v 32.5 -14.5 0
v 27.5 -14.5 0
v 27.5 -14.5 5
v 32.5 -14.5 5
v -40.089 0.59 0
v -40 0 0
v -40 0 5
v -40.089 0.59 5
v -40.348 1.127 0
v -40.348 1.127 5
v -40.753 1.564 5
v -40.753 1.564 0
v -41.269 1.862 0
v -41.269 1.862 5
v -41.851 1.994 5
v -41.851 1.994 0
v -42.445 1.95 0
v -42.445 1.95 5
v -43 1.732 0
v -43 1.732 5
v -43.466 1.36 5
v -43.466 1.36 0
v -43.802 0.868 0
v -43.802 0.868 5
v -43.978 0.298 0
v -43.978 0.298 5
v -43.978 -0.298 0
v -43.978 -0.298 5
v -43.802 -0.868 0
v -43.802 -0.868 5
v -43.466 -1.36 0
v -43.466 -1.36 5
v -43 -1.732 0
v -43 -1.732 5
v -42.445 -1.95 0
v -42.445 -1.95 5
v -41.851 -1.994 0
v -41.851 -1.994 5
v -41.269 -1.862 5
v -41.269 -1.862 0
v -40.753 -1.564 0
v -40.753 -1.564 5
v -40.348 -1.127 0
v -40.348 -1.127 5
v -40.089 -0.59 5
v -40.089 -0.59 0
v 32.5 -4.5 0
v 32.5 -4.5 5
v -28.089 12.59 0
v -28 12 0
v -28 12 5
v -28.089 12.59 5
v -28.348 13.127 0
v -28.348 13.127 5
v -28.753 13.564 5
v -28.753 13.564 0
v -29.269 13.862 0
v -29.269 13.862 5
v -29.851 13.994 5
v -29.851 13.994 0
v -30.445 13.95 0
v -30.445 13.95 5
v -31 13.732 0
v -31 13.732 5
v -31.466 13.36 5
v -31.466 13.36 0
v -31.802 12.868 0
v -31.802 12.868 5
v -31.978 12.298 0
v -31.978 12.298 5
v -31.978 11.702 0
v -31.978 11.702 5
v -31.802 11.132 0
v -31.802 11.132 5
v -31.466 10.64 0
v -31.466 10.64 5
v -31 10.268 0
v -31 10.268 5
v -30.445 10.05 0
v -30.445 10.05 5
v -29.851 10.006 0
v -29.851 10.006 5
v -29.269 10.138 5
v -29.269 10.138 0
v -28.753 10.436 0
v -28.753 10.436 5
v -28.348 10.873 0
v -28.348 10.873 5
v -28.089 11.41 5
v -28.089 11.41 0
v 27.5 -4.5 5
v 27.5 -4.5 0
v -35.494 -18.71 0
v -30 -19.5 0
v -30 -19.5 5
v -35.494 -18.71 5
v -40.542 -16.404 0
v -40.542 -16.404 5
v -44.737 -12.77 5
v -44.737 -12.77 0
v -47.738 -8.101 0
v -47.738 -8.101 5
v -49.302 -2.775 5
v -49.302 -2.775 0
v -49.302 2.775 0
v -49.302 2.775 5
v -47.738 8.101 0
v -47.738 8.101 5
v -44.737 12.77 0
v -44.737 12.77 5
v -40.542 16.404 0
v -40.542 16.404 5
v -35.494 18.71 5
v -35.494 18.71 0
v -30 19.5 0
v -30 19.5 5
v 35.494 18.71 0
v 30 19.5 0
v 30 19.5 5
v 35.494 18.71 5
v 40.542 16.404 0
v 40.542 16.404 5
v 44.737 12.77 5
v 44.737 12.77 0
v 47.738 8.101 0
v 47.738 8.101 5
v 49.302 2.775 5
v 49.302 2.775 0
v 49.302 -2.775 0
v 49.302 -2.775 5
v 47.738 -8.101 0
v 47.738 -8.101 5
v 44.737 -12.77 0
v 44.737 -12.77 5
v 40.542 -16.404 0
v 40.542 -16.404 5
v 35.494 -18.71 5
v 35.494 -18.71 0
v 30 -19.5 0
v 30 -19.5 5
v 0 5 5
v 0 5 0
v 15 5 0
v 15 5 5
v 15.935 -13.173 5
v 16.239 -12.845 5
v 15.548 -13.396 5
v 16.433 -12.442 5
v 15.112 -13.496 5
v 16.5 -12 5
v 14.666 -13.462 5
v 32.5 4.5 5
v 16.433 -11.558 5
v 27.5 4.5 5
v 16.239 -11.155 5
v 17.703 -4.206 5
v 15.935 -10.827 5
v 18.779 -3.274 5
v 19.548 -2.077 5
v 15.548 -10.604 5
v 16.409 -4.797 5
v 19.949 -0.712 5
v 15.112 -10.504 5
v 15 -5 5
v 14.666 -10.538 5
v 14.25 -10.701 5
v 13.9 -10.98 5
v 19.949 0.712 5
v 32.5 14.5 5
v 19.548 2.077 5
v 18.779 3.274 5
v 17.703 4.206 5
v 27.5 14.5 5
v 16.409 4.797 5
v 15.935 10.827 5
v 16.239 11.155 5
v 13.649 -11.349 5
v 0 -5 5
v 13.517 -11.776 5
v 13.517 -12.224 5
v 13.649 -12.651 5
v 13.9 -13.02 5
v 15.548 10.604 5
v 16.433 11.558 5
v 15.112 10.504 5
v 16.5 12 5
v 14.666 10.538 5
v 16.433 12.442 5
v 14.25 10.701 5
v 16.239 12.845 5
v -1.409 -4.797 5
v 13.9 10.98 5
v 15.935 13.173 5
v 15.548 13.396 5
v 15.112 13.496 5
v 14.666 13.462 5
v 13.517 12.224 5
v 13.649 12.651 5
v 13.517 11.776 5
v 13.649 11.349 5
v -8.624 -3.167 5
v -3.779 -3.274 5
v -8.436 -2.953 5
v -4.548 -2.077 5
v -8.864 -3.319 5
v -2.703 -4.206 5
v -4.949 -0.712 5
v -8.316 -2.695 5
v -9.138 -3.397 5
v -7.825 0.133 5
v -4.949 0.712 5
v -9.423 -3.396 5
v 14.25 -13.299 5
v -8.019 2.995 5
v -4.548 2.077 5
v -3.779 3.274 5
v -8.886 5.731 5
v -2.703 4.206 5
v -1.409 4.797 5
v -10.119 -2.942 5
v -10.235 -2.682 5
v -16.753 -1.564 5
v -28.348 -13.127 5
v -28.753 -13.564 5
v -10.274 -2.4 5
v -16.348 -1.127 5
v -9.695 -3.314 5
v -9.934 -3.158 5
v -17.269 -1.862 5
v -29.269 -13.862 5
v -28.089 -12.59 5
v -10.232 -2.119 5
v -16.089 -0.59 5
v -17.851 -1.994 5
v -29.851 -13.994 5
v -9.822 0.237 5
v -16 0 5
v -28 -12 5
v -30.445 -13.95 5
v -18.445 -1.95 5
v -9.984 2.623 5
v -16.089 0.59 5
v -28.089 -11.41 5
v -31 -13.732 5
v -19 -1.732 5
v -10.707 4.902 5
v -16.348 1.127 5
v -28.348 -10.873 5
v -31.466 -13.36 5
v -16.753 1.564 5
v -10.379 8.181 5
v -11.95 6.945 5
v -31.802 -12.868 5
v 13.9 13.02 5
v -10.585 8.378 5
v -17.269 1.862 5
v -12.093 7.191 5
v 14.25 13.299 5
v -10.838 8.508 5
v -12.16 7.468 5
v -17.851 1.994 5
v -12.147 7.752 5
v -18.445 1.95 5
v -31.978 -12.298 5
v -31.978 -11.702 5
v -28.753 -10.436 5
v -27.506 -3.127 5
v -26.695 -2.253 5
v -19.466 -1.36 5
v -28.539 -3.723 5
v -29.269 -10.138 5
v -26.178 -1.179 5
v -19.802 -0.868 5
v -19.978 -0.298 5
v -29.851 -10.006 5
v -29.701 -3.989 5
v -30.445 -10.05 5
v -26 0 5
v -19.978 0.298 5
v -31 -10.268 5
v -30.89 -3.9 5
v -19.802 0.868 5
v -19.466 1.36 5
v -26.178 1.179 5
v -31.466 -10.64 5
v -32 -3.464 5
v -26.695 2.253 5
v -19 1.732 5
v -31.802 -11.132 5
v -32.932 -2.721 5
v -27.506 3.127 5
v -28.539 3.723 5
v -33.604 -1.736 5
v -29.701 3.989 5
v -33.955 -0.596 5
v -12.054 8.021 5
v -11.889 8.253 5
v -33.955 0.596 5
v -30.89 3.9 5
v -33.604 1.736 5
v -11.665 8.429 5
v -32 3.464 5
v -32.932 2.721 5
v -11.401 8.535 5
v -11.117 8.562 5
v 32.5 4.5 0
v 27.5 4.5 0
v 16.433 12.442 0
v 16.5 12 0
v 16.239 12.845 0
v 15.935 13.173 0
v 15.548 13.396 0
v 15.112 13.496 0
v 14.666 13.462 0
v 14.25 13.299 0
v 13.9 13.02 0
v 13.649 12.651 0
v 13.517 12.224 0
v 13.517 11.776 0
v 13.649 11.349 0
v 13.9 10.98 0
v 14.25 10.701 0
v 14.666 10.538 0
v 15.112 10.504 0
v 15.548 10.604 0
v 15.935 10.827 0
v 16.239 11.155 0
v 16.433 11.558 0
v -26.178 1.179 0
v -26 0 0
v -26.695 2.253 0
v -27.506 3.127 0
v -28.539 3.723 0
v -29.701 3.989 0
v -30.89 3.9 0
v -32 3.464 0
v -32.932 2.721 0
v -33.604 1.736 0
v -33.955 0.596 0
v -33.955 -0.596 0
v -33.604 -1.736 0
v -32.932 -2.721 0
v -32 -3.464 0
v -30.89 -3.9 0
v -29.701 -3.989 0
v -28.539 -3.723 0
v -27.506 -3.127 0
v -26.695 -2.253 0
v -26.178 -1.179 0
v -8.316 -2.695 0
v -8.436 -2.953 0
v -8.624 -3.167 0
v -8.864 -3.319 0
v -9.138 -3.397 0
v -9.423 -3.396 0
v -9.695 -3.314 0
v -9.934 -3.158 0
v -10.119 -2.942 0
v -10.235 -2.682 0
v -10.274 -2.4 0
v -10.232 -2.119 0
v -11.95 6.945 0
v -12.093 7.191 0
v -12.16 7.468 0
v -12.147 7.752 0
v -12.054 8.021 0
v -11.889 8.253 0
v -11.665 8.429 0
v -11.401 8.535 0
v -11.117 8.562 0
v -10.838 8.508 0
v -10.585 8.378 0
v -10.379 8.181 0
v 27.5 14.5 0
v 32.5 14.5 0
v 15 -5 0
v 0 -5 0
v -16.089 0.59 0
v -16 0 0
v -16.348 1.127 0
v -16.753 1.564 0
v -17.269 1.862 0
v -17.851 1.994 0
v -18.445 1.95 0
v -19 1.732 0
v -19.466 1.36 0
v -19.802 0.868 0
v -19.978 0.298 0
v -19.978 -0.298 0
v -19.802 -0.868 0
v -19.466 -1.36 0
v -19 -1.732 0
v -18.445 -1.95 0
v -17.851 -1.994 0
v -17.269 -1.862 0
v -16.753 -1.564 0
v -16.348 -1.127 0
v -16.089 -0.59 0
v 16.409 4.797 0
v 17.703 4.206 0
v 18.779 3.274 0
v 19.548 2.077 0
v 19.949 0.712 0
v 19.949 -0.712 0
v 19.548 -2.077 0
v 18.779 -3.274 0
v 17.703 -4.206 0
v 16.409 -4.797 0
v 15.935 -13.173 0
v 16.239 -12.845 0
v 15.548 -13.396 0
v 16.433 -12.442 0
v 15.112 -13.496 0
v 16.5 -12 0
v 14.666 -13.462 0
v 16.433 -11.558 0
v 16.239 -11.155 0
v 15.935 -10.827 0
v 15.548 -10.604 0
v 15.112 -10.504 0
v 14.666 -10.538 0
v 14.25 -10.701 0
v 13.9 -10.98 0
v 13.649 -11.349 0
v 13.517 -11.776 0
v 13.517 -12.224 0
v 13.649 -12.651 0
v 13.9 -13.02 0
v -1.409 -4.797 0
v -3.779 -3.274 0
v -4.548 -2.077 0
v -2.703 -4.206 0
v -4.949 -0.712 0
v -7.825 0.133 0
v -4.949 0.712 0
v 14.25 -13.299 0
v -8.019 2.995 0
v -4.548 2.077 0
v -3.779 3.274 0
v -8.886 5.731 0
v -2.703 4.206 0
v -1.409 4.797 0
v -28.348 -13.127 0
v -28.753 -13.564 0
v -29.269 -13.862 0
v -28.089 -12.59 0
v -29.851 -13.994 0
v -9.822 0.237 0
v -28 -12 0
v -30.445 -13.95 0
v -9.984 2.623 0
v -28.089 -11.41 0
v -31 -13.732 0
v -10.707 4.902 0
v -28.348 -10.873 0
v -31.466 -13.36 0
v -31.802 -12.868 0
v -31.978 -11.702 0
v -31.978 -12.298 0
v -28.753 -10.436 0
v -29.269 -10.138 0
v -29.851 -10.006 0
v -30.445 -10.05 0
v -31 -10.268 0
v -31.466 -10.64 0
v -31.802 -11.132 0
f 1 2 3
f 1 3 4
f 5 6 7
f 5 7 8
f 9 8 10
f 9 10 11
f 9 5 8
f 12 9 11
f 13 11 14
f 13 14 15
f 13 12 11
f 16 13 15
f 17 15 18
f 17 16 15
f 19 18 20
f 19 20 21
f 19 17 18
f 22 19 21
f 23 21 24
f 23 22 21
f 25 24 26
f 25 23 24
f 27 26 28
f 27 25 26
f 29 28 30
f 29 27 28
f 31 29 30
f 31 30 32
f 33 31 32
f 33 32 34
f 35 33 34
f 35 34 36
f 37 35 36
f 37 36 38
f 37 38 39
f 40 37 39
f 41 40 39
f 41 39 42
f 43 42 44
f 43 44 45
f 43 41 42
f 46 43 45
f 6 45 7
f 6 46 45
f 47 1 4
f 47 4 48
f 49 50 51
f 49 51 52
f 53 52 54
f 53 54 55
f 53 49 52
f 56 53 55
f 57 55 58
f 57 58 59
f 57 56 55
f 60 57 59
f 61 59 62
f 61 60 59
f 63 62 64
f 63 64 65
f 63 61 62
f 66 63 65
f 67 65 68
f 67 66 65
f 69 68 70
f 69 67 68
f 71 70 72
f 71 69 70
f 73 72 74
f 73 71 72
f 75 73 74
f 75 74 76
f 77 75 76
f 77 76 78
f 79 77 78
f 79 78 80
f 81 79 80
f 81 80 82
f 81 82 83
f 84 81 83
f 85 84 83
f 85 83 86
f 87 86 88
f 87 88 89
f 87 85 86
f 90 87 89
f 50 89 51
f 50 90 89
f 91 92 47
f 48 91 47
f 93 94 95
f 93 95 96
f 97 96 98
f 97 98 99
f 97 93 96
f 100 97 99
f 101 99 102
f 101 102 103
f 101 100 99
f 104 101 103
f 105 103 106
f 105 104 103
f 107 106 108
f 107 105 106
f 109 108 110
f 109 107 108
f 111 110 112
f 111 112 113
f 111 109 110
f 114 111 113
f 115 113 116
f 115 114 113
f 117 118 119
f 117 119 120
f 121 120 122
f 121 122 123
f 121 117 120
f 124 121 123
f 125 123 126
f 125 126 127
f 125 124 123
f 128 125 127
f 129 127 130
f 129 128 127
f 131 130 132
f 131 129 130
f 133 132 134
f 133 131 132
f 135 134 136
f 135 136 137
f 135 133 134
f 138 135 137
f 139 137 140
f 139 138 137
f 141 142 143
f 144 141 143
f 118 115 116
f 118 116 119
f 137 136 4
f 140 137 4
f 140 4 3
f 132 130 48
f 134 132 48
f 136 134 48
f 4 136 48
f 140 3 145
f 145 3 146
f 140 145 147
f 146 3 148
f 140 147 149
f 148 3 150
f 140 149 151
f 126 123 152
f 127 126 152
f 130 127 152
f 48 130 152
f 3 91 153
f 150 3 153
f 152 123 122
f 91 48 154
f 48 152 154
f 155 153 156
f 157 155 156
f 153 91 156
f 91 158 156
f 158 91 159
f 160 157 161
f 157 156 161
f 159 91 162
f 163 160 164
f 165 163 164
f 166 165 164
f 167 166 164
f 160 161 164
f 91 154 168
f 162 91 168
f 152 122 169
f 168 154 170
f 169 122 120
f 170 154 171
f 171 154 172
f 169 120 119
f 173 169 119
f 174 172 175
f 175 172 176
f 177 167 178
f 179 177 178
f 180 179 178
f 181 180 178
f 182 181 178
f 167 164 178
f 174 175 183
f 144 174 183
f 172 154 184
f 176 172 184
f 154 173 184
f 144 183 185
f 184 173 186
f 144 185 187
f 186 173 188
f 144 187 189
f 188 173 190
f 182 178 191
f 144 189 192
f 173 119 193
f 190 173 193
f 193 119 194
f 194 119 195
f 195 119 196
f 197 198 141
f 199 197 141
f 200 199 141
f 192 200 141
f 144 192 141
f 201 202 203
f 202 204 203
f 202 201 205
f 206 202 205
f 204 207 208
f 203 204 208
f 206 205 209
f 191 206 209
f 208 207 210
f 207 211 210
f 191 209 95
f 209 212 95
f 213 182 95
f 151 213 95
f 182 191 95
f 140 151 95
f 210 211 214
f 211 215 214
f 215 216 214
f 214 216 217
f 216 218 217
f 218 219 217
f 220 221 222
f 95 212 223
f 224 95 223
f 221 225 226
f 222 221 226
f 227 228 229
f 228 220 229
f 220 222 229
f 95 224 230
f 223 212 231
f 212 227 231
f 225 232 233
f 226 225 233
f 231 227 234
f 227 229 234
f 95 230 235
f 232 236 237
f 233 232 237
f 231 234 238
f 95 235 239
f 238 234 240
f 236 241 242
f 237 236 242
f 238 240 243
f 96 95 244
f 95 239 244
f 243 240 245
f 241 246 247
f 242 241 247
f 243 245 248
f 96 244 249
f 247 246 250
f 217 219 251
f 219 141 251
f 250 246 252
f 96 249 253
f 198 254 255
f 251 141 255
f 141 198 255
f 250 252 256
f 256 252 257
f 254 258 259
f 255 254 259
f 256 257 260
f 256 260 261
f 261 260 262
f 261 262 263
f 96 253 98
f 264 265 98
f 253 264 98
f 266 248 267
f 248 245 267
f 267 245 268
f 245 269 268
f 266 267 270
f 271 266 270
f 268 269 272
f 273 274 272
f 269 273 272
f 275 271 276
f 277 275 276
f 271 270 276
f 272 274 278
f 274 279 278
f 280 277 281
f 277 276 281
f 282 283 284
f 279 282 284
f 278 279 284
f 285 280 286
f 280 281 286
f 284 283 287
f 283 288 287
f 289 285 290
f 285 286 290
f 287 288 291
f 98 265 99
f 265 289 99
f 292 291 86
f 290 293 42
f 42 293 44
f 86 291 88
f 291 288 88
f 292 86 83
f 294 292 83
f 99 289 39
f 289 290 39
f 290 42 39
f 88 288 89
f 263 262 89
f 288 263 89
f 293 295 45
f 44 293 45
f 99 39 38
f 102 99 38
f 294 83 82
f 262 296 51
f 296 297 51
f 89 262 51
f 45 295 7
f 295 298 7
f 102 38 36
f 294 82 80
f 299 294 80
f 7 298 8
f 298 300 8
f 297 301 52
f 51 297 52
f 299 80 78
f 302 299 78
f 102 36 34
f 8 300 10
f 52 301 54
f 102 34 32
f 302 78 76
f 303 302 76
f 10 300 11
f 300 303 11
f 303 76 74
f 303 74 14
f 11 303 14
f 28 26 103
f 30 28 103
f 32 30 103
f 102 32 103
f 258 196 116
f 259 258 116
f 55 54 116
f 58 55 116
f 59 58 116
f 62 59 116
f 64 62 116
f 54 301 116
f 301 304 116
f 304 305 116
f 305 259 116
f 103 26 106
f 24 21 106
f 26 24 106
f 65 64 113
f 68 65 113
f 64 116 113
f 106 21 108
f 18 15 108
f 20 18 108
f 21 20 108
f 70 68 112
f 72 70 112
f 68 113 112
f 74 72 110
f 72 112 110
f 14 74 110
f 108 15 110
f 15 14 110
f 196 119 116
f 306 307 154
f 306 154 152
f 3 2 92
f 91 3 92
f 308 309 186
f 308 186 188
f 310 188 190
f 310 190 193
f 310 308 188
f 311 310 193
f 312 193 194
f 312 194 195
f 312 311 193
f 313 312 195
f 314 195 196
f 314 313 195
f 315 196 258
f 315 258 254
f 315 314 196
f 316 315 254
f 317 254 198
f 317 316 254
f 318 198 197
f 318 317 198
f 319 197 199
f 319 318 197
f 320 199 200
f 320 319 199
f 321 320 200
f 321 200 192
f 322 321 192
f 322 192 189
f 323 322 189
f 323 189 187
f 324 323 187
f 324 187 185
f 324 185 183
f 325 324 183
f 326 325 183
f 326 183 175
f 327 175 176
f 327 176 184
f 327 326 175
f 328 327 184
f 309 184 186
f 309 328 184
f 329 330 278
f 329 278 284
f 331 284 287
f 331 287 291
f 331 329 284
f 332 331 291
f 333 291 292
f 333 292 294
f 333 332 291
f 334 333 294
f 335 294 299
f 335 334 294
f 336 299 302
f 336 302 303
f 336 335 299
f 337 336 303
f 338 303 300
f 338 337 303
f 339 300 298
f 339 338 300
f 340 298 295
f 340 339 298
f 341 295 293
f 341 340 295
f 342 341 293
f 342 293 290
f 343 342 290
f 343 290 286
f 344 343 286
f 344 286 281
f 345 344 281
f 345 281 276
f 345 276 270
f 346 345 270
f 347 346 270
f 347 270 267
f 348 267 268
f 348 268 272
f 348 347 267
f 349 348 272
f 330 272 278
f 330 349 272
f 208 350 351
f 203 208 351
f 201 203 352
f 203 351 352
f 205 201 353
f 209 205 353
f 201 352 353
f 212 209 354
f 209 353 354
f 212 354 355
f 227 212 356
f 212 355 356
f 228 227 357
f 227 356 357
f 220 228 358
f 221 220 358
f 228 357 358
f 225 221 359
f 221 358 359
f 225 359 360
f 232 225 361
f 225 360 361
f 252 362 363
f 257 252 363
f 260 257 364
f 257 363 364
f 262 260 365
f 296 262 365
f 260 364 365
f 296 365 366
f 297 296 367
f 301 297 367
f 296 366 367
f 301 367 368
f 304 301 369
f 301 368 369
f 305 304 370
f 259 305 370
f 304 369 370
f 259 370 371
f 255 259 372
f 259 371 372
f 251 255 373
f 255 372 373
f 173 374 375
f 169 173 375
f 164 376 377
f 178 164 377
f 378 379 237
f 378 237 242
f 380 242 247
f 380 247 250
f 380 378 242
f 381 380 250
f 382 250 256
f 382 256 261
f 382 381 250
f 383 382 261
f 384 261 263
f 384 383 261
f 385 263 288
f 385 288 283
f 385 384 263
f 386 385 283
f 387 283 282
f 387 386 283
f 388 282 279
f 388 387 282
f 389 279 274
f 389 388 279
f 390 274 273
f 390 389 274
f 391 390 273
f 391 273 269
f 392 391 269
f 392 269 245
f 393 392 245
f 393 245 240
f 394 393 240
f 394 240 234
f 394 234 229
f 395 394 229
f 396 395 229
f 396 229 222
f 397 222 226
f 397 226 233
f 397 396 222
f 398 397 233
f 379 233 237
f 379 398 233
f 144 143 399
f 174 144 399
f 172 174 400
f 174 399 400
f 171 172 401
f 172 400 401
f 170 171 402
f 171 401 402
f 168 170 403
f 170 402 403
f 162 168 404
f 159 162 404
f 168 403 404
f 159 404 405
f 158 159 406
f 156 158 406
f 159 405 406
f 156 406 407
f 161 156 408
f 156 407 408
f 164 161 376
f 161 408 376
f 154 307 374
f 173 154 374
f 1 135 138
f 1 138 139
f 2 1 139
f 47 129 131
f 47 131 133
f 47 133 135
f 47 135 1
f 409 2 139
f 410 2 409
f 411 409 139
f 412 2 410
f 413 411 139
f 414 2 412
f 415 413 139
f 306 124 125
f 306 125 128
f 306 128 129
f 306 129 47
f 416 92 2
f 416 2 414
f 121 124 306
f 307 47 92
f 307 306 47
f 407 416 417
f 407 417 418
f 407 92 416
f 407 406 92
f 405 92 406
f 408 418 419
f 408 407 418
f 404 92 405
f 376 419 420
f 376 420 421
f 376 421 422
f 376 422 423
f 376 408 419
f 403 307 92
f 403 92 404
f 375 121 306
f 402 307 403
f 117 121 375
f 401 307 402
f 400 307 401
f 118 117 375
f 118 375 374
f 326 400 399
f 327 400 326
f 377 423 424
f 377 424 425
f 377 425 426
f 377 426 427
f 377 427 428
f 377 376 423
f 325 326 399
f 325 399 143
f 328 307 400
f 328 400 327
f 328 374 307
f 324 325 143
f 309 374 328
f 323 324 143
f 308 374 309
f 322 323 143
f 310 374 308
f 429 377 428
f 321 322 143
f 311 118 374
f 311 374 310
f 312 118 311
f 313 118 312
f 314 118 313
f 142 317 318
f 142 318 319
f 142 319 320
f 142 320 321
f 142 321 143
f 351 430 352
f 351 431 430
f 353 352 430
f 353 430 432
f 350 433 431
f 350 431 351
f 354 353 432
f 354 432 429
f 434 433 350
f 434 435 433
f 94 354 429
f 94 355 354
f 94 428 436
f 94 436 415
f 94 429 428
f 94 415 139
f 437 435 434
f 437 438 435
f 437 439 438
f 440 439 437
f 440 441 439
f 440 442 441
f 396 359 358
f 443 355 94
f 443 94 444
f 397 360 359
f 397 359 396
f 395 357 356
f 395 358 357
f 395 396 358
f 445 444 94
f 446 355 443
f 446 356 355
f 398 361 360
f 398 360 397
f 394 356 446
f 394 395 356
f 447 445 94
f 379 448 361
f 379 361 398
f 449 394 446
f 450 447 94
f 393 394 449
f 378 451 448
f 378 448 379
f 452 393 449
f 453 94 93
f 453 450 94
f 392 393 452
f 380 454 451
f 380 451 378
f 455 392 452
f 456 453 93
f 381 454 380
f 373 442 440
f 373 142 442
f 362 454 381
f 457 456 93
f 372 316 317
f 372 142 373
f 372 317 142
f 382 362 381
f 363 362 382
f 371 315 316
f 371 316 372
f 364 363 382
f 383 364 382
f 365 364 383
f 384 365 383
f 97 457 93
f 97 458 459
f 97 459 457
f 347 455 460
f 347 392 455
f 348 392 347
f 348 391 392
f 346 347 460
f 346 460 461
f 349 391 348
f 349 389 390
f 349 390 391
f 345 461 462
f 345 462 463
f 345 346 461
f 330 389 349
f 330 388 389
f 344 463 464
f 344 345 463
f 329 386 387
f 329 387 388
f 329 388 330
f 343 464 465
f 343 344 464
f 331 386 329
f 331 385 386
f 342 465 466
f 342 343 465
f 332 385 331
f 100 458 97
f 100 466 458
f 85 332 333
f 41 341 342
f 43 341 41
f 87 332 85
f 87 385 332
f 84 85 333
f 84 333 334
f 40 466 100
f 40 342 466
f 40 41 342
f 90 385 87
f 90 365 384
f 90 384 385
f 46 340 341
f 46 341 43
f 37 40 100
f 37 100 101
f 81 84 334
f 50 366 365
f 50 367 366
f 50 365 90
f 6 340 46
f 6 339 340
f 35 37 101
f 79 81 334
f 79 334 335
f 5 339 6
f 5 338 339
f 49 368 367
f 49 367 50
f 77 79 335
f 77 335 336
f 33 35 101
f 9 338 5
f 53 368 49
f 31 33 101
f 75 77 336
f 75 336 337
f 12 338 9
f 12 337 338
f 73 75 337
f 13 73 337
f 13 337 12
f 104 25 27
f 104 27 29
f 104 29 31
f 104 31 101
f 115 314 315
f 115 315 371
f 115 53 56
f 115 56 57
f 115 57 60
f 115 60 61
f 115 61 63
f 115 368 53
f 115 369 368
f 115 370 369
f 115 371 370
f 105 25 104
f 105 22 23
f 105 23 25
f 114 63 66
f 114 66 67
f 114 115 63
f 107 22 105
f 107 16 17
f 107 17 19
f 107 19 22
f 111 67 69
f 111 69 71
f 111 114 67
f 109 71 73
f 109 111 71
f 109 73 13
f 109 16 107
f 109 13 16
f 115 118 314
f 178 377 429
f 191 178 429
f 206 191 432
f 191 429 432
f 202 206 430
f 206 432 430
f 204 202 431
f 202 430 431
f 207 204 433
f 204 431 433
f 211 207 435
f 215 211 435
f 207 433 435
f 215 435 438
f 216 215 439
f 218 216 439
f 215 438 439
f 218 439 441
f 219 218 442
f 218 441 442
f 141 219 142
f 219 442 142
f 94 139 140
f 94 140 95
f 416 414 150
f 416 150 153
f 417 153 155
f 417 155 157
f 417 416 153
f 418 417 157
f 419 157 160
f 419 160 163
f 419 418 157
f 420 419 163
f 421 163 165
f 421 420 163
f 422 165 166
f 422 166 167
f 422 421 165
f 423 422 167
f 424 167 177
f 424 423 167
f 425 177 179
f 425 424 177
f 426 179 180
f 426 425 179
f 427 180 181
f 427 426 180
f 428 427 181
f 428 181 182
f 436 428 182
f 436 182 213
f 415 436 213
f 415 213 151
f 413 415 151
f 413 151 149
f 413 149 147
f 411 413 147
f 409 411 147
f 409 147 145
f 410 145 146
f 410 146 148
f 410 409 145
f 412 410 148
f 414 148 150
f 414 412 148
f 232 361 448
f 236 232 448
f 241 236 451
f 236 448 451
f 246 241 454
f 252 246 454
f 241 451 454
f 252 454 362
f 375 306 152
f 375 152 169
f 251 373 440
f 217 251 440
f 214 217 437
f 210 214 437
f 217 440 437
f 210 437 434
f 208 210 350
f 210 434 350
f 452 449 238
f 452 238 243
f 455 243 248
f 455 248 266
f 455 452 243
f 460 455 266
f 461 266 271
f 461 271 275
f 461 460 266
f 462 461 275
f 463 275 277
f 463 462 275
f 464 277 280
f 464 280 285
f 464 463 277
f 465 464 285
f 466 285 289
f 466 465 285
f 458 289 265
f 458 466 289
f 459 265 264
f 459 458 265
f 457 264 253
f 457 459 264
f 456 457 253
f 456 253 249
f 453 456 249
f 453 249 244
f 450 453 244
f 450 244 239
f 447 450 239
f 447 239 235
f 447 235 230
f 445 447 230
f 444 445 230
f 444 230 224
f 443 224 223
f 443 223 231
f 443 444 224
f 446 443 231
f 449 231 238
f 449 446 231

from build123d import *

# Parameters (mm, degrees)
SKETCH1_R           = 2
SKETCH1_R_2         = 4
SKETCH1_R_3         = 1.5
SKETCH1_W           = 5
SKETCH1_H           = 10
BOSS_EXTRUDE1_DEPTH = 5


with BuildPart() as part:
    # Sketch1 → Boss-Extrude1 (new body)
    with BuildSketch(Plane.XY):
        with BuildLine():
            Line((-30, 19.5), (30, 19.5))
            ThreePointArc((30, 19.5), (49.5, 0), (30, -19.5))
            Line((30, -19.5), (-30, -19.5))
            ThreePointArc((-30, -19.5), (-49.5, 0), (-30, 19.5))
        make_face()
        with Locations((-30, 12)):
            Circle(SKETCH1_R, mode=Mode.SUBTRACT)
        with Locations((-18, 0)):
            Circle(SKETCH1_R, mode=Mode.SUBTRACT)
        with Locations((-30, -12)):
            Circle(SKETCH1_R, mode=Mode.SUBTRACT)
        with Locations((-42, 0)):
            Circle(SKETCH1_R, mode=Mode.SUBTRACT)
        with Locations((-30, 0)):
            Circle(SKETCH1_R_2, mode=Mode.SUBTRACT)
        with Locations((15, 12)):
            Circle(SKETCH1_R_3, mode=Mode.SUBTRACT)
        with Locations((15, -12)):
            Circle(SKETCH1_R_3, mode=Mode.SUBTRACT)
        with BuildLine():
            Line((15, -5), (0, -5))
            ThreePointArc((0, -5), (-5, 0), (0, 5))
            Line((0, 5), (15, 5))
            ThreePointArc((15, 5), (20, 0), (15, -5))
        make_face(mode=Mode.SUBTRACT)
        with Locations((30, 9.5)):
            Rectangle(SKETCH1_W, SKETCH1_H, mode=Mode.SUBTRACT)
        with Locations((30, -9.5)):
            Rectangle(SKETCH1_W, SKETCH1_H, mode=Mode.SUBTRACT)
        with BuildLine():
            ThreePointArc((-11.950316083, 6.944527868), (-11.782969997, 8.348805364), (-10.3786925, 8.181459278))
            ThreePointArc((-10.3786925, 8.181459278), (-8.018515434, 2.995451326), (-8.316401238, -2.694573131))
            ThreePointArc((-8.316401238, -2.694573131), (-9.561940964, -3.364372198), (-10.231740032, -2.118832472))
            ThreePointArc((-10.231740032, -2.118832472), (-9.983501861, 2.622854574), (-11.950316083, 6.944527868))
        make_face(mode=Mode.SUBTRACT)
    extrude(amount=BOSS_EXTRUDE1_DEPTH)


solid = part.part
